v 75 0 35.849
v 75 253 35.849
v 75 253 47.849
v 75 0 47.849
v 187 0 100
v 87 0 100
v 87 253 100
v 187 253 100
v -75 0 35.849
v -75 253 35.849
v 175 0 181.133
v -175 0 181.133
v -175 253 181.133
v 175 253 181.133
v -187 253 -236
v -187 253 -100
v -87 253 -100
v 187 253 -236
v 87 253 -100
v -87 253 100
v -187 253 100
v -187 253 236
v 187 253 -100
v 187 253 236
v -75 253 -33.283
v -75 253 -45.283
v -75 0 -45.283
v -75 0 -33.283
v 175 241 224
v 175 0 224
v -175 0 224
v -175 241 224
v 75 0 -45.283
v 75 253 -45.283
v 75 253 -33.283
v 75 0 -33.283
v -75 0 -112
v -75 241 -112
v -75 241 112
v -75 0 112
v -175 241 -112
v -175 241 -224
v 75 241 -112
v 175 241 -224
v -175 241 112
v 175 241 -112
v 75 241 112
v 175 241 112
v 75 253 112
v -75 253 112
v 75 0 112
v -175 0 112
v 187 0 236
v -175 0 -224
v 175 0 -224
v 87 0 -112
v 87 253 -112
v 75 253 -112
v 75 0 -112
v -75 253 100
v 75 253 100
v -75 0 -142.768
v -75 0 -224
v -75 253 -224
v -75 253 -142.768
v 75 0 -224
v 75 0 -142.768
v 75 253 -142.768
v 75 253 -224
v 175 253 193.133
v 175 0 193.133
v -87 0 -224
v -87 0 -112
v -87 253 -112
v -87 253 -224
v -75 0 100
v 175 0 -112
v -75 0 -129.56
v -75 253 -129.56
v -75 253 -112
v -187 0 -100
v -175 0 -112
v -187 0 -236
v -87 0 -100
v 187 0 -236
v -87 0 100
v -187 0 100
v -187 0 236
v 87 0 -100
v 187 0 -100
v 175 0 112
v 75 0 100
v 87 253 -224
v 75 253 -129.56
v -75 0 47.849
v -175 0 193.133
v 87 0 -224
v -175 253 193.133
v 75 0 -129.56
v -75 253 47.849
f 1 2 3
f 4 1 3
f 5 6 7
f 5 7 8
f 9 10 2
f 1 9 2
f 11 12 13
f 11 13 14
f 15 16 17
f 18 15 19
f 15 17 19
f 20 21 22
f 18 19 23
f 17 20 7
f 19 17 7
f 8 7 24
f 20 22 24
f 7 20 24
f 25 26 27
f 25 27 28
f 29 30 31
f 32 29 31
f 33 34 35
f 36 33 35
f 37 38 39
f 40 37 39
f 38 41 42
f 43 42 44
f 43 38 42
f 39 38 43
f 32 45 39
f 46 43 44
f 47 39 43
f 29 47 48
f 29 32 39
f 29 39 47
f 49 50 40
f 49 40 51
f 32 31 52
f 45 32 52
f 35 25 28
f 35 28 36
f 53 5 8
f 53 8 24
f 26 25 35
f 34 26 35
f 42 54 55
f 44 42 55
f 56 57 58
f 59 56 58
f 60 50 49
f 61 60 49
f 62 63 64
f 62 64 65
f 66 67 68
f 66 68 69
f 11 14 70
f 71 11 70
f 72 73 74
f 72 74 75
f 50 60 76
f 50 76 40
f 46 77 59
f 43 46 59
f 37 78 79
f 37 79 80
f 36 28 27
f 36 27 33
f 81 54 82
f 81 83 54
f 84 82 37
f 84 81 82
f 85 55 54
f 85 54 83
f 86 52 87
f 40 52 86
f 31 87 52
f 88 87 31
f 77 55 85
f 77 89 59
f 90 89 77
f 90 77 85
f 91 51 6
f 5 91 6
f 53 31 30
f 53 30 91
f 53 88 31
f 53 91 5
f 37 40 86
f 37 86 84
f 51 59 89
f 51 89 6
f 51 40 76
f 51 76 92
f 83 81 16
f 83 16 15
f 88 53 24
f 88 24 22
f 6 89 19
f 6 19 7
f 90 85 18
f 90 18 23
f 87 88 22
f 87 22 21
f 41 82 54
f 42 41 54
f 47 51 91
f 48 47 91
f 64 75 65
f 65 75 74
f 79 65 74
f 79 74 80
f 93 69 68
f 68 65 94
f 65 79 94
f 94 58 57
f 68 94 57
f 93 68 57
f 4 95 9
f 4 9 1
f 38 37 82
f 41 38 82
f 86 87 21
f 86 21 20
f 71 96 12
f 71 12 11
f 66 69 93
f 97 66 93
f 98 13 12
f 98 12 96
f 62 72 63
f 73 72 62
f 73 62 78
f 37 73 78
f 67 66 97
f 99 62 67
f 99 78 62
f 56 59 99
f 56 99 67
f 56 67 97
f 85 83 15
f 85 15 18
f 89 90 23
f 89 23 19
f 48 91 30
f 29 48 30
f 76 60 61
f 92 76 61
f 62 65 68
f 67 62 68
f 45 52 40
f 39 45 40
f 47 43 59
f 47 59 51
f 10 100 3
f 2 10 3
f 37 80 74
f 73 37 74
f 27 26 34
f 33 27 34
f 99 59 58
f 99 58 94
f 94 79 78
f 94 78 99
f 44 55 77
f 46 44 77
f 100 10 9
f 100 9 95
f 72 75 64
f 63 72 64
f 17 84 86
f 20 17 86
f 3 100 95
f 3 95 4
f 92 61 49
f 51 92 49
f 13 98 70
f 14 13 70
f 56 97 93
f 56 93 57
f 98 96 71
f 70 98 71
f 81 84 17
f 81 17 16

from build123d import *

# Parameters (mm, degrees)
F0_W     = 174
F0_H     = 200
F1_DEPTH = 253
F2_T     = -12
F3_W     = 350
F3_H     = 12
F4_DEPTH = 253
F3_W_2   = 150
F3_H_2   = 13.2076144218


with BuildPart() as f1:
    # F0 (on Front) → F1 (new body)
    with BuildSketch(Plane.XZ):
        Polygon((-87, -100), (-187, -100), (-187, -236), (187, -236), (187, -100), (87, -100), align=None)
        Rectangle(F0_W, F0_H)
        Polygon((187, 236), (-187, 236), (-187, 100), (-87, 100), (87, 100), (187, 100), align=None)
    extrude(amount=-F1_DEPTH)

    # F2
    f2_openings = [f1.faces().sort_by_distance(p)[0] for p in [
        (0, 0, 0),
    ]]
    offset(amount=F2_T, openings=f2_openings, kind=Kind.INTERSECTION)


with BuildPart() as f4:
    # F3 (on face) → F4 (new body)
    with BuildSketch(Plane.XZ):
        with Locations((0, 187.1330020428)):
            Rectangle(F3_W, F3_H)
    extrude(amount=-F4_DEPTH)


with BuildPart() as f4b:
    # F3 (on face) → F4, piece 2 (new body)
    with BuildSketch(Plane.XZ):
        with Locations((0, 106)):
            Rectangle(F3_W_2, F3_H)
    extrude(amount=-F4_DEPTH)


with BuildPart() as f4c:
    # F3 (on face) → F4, piece 3 (new body)
    with BuildSketch(Plane.XZ):
        with Locations((0, 41.8492396772)):
            Rectangle(F3_W_2, F3_H)
    extrude(amount=-F4_DEPTH)


with BuildPart() as f4d:
    # F3 (on face) → F4, piece 4 (new body)
    with BuildSketch(Plane.XZ):
        with Locations((0, -39.2832505107)):
            Rectangle(F3_W_2, F3_H)
    extrude(amount=-F4_DEPTH)


with BuildPart() as f4e:
    # F3 (on face) → F4, piece 5 (new body)
    with BuildSketch(Plane.XZ):
        with Locations((0, -136.1642181873)):
            Rectangle(F3_W_2, F3_H_2)
        Polygon((-75, -129.5604109764), (-75, -112), (-87, -112), (-87, -224), (-75, -224), (-75, -142.7680253983), align=None)
        Polygon((87, -112), (75, -112), (75, -129.5604109764), (75, -142.7680253983), (75, -224), (87, -224), align=None)
    extrude(amount=-F4_DEPTH)


solid = Compound([f1.part, f4.part, f4b.part, f4c.part, f4d.part, f4e.part])
